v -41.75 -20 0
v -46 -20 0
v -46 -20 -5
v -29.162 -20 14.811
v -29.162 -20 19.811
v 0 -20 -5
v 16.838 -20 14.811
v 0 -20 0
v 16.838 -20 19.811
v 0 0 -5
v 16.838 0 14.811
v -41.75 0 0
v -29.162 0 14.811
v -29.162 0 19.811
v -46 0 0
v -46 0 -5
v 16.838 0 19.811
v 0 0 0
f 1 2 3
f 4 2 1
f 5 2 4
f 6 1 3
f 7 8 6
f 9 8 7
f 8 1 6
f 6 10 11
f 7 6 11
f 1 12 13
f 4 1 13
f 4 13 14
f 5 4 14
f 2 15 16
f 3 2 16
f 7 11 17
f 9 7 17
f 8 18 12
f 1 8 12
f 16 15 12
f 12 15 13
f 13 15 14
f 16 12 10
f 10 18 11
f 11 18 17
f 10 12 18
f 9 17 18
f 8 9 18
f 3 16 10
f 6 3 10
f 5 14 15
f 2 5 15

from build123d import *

# Parameters (mm, degrees)
F1_DEPTH = 20


with BuildPart() as f1:
    # F0 (on Front) → F1 (new body)
    with BuildSketch(Plane.XZ):
        Polygon((-46, -5), (-41.750403, 0), (-46, 0), align=None)
        Polygon((0, -5), (0, 0), (-41.750403, 0), (-46, -5), align=None)
        Polygon((-46, 0), (-41.750403, 0), (-29.162069, 14.811211), (-29.162069, 19.811211), align=None)
        Polygon((16.837931, 19.811211), (0, 0), (0, -5), (16.837931, 14.811211), align=None)
    extrude(amount=F1_DEPTH)


solid = f1.part
